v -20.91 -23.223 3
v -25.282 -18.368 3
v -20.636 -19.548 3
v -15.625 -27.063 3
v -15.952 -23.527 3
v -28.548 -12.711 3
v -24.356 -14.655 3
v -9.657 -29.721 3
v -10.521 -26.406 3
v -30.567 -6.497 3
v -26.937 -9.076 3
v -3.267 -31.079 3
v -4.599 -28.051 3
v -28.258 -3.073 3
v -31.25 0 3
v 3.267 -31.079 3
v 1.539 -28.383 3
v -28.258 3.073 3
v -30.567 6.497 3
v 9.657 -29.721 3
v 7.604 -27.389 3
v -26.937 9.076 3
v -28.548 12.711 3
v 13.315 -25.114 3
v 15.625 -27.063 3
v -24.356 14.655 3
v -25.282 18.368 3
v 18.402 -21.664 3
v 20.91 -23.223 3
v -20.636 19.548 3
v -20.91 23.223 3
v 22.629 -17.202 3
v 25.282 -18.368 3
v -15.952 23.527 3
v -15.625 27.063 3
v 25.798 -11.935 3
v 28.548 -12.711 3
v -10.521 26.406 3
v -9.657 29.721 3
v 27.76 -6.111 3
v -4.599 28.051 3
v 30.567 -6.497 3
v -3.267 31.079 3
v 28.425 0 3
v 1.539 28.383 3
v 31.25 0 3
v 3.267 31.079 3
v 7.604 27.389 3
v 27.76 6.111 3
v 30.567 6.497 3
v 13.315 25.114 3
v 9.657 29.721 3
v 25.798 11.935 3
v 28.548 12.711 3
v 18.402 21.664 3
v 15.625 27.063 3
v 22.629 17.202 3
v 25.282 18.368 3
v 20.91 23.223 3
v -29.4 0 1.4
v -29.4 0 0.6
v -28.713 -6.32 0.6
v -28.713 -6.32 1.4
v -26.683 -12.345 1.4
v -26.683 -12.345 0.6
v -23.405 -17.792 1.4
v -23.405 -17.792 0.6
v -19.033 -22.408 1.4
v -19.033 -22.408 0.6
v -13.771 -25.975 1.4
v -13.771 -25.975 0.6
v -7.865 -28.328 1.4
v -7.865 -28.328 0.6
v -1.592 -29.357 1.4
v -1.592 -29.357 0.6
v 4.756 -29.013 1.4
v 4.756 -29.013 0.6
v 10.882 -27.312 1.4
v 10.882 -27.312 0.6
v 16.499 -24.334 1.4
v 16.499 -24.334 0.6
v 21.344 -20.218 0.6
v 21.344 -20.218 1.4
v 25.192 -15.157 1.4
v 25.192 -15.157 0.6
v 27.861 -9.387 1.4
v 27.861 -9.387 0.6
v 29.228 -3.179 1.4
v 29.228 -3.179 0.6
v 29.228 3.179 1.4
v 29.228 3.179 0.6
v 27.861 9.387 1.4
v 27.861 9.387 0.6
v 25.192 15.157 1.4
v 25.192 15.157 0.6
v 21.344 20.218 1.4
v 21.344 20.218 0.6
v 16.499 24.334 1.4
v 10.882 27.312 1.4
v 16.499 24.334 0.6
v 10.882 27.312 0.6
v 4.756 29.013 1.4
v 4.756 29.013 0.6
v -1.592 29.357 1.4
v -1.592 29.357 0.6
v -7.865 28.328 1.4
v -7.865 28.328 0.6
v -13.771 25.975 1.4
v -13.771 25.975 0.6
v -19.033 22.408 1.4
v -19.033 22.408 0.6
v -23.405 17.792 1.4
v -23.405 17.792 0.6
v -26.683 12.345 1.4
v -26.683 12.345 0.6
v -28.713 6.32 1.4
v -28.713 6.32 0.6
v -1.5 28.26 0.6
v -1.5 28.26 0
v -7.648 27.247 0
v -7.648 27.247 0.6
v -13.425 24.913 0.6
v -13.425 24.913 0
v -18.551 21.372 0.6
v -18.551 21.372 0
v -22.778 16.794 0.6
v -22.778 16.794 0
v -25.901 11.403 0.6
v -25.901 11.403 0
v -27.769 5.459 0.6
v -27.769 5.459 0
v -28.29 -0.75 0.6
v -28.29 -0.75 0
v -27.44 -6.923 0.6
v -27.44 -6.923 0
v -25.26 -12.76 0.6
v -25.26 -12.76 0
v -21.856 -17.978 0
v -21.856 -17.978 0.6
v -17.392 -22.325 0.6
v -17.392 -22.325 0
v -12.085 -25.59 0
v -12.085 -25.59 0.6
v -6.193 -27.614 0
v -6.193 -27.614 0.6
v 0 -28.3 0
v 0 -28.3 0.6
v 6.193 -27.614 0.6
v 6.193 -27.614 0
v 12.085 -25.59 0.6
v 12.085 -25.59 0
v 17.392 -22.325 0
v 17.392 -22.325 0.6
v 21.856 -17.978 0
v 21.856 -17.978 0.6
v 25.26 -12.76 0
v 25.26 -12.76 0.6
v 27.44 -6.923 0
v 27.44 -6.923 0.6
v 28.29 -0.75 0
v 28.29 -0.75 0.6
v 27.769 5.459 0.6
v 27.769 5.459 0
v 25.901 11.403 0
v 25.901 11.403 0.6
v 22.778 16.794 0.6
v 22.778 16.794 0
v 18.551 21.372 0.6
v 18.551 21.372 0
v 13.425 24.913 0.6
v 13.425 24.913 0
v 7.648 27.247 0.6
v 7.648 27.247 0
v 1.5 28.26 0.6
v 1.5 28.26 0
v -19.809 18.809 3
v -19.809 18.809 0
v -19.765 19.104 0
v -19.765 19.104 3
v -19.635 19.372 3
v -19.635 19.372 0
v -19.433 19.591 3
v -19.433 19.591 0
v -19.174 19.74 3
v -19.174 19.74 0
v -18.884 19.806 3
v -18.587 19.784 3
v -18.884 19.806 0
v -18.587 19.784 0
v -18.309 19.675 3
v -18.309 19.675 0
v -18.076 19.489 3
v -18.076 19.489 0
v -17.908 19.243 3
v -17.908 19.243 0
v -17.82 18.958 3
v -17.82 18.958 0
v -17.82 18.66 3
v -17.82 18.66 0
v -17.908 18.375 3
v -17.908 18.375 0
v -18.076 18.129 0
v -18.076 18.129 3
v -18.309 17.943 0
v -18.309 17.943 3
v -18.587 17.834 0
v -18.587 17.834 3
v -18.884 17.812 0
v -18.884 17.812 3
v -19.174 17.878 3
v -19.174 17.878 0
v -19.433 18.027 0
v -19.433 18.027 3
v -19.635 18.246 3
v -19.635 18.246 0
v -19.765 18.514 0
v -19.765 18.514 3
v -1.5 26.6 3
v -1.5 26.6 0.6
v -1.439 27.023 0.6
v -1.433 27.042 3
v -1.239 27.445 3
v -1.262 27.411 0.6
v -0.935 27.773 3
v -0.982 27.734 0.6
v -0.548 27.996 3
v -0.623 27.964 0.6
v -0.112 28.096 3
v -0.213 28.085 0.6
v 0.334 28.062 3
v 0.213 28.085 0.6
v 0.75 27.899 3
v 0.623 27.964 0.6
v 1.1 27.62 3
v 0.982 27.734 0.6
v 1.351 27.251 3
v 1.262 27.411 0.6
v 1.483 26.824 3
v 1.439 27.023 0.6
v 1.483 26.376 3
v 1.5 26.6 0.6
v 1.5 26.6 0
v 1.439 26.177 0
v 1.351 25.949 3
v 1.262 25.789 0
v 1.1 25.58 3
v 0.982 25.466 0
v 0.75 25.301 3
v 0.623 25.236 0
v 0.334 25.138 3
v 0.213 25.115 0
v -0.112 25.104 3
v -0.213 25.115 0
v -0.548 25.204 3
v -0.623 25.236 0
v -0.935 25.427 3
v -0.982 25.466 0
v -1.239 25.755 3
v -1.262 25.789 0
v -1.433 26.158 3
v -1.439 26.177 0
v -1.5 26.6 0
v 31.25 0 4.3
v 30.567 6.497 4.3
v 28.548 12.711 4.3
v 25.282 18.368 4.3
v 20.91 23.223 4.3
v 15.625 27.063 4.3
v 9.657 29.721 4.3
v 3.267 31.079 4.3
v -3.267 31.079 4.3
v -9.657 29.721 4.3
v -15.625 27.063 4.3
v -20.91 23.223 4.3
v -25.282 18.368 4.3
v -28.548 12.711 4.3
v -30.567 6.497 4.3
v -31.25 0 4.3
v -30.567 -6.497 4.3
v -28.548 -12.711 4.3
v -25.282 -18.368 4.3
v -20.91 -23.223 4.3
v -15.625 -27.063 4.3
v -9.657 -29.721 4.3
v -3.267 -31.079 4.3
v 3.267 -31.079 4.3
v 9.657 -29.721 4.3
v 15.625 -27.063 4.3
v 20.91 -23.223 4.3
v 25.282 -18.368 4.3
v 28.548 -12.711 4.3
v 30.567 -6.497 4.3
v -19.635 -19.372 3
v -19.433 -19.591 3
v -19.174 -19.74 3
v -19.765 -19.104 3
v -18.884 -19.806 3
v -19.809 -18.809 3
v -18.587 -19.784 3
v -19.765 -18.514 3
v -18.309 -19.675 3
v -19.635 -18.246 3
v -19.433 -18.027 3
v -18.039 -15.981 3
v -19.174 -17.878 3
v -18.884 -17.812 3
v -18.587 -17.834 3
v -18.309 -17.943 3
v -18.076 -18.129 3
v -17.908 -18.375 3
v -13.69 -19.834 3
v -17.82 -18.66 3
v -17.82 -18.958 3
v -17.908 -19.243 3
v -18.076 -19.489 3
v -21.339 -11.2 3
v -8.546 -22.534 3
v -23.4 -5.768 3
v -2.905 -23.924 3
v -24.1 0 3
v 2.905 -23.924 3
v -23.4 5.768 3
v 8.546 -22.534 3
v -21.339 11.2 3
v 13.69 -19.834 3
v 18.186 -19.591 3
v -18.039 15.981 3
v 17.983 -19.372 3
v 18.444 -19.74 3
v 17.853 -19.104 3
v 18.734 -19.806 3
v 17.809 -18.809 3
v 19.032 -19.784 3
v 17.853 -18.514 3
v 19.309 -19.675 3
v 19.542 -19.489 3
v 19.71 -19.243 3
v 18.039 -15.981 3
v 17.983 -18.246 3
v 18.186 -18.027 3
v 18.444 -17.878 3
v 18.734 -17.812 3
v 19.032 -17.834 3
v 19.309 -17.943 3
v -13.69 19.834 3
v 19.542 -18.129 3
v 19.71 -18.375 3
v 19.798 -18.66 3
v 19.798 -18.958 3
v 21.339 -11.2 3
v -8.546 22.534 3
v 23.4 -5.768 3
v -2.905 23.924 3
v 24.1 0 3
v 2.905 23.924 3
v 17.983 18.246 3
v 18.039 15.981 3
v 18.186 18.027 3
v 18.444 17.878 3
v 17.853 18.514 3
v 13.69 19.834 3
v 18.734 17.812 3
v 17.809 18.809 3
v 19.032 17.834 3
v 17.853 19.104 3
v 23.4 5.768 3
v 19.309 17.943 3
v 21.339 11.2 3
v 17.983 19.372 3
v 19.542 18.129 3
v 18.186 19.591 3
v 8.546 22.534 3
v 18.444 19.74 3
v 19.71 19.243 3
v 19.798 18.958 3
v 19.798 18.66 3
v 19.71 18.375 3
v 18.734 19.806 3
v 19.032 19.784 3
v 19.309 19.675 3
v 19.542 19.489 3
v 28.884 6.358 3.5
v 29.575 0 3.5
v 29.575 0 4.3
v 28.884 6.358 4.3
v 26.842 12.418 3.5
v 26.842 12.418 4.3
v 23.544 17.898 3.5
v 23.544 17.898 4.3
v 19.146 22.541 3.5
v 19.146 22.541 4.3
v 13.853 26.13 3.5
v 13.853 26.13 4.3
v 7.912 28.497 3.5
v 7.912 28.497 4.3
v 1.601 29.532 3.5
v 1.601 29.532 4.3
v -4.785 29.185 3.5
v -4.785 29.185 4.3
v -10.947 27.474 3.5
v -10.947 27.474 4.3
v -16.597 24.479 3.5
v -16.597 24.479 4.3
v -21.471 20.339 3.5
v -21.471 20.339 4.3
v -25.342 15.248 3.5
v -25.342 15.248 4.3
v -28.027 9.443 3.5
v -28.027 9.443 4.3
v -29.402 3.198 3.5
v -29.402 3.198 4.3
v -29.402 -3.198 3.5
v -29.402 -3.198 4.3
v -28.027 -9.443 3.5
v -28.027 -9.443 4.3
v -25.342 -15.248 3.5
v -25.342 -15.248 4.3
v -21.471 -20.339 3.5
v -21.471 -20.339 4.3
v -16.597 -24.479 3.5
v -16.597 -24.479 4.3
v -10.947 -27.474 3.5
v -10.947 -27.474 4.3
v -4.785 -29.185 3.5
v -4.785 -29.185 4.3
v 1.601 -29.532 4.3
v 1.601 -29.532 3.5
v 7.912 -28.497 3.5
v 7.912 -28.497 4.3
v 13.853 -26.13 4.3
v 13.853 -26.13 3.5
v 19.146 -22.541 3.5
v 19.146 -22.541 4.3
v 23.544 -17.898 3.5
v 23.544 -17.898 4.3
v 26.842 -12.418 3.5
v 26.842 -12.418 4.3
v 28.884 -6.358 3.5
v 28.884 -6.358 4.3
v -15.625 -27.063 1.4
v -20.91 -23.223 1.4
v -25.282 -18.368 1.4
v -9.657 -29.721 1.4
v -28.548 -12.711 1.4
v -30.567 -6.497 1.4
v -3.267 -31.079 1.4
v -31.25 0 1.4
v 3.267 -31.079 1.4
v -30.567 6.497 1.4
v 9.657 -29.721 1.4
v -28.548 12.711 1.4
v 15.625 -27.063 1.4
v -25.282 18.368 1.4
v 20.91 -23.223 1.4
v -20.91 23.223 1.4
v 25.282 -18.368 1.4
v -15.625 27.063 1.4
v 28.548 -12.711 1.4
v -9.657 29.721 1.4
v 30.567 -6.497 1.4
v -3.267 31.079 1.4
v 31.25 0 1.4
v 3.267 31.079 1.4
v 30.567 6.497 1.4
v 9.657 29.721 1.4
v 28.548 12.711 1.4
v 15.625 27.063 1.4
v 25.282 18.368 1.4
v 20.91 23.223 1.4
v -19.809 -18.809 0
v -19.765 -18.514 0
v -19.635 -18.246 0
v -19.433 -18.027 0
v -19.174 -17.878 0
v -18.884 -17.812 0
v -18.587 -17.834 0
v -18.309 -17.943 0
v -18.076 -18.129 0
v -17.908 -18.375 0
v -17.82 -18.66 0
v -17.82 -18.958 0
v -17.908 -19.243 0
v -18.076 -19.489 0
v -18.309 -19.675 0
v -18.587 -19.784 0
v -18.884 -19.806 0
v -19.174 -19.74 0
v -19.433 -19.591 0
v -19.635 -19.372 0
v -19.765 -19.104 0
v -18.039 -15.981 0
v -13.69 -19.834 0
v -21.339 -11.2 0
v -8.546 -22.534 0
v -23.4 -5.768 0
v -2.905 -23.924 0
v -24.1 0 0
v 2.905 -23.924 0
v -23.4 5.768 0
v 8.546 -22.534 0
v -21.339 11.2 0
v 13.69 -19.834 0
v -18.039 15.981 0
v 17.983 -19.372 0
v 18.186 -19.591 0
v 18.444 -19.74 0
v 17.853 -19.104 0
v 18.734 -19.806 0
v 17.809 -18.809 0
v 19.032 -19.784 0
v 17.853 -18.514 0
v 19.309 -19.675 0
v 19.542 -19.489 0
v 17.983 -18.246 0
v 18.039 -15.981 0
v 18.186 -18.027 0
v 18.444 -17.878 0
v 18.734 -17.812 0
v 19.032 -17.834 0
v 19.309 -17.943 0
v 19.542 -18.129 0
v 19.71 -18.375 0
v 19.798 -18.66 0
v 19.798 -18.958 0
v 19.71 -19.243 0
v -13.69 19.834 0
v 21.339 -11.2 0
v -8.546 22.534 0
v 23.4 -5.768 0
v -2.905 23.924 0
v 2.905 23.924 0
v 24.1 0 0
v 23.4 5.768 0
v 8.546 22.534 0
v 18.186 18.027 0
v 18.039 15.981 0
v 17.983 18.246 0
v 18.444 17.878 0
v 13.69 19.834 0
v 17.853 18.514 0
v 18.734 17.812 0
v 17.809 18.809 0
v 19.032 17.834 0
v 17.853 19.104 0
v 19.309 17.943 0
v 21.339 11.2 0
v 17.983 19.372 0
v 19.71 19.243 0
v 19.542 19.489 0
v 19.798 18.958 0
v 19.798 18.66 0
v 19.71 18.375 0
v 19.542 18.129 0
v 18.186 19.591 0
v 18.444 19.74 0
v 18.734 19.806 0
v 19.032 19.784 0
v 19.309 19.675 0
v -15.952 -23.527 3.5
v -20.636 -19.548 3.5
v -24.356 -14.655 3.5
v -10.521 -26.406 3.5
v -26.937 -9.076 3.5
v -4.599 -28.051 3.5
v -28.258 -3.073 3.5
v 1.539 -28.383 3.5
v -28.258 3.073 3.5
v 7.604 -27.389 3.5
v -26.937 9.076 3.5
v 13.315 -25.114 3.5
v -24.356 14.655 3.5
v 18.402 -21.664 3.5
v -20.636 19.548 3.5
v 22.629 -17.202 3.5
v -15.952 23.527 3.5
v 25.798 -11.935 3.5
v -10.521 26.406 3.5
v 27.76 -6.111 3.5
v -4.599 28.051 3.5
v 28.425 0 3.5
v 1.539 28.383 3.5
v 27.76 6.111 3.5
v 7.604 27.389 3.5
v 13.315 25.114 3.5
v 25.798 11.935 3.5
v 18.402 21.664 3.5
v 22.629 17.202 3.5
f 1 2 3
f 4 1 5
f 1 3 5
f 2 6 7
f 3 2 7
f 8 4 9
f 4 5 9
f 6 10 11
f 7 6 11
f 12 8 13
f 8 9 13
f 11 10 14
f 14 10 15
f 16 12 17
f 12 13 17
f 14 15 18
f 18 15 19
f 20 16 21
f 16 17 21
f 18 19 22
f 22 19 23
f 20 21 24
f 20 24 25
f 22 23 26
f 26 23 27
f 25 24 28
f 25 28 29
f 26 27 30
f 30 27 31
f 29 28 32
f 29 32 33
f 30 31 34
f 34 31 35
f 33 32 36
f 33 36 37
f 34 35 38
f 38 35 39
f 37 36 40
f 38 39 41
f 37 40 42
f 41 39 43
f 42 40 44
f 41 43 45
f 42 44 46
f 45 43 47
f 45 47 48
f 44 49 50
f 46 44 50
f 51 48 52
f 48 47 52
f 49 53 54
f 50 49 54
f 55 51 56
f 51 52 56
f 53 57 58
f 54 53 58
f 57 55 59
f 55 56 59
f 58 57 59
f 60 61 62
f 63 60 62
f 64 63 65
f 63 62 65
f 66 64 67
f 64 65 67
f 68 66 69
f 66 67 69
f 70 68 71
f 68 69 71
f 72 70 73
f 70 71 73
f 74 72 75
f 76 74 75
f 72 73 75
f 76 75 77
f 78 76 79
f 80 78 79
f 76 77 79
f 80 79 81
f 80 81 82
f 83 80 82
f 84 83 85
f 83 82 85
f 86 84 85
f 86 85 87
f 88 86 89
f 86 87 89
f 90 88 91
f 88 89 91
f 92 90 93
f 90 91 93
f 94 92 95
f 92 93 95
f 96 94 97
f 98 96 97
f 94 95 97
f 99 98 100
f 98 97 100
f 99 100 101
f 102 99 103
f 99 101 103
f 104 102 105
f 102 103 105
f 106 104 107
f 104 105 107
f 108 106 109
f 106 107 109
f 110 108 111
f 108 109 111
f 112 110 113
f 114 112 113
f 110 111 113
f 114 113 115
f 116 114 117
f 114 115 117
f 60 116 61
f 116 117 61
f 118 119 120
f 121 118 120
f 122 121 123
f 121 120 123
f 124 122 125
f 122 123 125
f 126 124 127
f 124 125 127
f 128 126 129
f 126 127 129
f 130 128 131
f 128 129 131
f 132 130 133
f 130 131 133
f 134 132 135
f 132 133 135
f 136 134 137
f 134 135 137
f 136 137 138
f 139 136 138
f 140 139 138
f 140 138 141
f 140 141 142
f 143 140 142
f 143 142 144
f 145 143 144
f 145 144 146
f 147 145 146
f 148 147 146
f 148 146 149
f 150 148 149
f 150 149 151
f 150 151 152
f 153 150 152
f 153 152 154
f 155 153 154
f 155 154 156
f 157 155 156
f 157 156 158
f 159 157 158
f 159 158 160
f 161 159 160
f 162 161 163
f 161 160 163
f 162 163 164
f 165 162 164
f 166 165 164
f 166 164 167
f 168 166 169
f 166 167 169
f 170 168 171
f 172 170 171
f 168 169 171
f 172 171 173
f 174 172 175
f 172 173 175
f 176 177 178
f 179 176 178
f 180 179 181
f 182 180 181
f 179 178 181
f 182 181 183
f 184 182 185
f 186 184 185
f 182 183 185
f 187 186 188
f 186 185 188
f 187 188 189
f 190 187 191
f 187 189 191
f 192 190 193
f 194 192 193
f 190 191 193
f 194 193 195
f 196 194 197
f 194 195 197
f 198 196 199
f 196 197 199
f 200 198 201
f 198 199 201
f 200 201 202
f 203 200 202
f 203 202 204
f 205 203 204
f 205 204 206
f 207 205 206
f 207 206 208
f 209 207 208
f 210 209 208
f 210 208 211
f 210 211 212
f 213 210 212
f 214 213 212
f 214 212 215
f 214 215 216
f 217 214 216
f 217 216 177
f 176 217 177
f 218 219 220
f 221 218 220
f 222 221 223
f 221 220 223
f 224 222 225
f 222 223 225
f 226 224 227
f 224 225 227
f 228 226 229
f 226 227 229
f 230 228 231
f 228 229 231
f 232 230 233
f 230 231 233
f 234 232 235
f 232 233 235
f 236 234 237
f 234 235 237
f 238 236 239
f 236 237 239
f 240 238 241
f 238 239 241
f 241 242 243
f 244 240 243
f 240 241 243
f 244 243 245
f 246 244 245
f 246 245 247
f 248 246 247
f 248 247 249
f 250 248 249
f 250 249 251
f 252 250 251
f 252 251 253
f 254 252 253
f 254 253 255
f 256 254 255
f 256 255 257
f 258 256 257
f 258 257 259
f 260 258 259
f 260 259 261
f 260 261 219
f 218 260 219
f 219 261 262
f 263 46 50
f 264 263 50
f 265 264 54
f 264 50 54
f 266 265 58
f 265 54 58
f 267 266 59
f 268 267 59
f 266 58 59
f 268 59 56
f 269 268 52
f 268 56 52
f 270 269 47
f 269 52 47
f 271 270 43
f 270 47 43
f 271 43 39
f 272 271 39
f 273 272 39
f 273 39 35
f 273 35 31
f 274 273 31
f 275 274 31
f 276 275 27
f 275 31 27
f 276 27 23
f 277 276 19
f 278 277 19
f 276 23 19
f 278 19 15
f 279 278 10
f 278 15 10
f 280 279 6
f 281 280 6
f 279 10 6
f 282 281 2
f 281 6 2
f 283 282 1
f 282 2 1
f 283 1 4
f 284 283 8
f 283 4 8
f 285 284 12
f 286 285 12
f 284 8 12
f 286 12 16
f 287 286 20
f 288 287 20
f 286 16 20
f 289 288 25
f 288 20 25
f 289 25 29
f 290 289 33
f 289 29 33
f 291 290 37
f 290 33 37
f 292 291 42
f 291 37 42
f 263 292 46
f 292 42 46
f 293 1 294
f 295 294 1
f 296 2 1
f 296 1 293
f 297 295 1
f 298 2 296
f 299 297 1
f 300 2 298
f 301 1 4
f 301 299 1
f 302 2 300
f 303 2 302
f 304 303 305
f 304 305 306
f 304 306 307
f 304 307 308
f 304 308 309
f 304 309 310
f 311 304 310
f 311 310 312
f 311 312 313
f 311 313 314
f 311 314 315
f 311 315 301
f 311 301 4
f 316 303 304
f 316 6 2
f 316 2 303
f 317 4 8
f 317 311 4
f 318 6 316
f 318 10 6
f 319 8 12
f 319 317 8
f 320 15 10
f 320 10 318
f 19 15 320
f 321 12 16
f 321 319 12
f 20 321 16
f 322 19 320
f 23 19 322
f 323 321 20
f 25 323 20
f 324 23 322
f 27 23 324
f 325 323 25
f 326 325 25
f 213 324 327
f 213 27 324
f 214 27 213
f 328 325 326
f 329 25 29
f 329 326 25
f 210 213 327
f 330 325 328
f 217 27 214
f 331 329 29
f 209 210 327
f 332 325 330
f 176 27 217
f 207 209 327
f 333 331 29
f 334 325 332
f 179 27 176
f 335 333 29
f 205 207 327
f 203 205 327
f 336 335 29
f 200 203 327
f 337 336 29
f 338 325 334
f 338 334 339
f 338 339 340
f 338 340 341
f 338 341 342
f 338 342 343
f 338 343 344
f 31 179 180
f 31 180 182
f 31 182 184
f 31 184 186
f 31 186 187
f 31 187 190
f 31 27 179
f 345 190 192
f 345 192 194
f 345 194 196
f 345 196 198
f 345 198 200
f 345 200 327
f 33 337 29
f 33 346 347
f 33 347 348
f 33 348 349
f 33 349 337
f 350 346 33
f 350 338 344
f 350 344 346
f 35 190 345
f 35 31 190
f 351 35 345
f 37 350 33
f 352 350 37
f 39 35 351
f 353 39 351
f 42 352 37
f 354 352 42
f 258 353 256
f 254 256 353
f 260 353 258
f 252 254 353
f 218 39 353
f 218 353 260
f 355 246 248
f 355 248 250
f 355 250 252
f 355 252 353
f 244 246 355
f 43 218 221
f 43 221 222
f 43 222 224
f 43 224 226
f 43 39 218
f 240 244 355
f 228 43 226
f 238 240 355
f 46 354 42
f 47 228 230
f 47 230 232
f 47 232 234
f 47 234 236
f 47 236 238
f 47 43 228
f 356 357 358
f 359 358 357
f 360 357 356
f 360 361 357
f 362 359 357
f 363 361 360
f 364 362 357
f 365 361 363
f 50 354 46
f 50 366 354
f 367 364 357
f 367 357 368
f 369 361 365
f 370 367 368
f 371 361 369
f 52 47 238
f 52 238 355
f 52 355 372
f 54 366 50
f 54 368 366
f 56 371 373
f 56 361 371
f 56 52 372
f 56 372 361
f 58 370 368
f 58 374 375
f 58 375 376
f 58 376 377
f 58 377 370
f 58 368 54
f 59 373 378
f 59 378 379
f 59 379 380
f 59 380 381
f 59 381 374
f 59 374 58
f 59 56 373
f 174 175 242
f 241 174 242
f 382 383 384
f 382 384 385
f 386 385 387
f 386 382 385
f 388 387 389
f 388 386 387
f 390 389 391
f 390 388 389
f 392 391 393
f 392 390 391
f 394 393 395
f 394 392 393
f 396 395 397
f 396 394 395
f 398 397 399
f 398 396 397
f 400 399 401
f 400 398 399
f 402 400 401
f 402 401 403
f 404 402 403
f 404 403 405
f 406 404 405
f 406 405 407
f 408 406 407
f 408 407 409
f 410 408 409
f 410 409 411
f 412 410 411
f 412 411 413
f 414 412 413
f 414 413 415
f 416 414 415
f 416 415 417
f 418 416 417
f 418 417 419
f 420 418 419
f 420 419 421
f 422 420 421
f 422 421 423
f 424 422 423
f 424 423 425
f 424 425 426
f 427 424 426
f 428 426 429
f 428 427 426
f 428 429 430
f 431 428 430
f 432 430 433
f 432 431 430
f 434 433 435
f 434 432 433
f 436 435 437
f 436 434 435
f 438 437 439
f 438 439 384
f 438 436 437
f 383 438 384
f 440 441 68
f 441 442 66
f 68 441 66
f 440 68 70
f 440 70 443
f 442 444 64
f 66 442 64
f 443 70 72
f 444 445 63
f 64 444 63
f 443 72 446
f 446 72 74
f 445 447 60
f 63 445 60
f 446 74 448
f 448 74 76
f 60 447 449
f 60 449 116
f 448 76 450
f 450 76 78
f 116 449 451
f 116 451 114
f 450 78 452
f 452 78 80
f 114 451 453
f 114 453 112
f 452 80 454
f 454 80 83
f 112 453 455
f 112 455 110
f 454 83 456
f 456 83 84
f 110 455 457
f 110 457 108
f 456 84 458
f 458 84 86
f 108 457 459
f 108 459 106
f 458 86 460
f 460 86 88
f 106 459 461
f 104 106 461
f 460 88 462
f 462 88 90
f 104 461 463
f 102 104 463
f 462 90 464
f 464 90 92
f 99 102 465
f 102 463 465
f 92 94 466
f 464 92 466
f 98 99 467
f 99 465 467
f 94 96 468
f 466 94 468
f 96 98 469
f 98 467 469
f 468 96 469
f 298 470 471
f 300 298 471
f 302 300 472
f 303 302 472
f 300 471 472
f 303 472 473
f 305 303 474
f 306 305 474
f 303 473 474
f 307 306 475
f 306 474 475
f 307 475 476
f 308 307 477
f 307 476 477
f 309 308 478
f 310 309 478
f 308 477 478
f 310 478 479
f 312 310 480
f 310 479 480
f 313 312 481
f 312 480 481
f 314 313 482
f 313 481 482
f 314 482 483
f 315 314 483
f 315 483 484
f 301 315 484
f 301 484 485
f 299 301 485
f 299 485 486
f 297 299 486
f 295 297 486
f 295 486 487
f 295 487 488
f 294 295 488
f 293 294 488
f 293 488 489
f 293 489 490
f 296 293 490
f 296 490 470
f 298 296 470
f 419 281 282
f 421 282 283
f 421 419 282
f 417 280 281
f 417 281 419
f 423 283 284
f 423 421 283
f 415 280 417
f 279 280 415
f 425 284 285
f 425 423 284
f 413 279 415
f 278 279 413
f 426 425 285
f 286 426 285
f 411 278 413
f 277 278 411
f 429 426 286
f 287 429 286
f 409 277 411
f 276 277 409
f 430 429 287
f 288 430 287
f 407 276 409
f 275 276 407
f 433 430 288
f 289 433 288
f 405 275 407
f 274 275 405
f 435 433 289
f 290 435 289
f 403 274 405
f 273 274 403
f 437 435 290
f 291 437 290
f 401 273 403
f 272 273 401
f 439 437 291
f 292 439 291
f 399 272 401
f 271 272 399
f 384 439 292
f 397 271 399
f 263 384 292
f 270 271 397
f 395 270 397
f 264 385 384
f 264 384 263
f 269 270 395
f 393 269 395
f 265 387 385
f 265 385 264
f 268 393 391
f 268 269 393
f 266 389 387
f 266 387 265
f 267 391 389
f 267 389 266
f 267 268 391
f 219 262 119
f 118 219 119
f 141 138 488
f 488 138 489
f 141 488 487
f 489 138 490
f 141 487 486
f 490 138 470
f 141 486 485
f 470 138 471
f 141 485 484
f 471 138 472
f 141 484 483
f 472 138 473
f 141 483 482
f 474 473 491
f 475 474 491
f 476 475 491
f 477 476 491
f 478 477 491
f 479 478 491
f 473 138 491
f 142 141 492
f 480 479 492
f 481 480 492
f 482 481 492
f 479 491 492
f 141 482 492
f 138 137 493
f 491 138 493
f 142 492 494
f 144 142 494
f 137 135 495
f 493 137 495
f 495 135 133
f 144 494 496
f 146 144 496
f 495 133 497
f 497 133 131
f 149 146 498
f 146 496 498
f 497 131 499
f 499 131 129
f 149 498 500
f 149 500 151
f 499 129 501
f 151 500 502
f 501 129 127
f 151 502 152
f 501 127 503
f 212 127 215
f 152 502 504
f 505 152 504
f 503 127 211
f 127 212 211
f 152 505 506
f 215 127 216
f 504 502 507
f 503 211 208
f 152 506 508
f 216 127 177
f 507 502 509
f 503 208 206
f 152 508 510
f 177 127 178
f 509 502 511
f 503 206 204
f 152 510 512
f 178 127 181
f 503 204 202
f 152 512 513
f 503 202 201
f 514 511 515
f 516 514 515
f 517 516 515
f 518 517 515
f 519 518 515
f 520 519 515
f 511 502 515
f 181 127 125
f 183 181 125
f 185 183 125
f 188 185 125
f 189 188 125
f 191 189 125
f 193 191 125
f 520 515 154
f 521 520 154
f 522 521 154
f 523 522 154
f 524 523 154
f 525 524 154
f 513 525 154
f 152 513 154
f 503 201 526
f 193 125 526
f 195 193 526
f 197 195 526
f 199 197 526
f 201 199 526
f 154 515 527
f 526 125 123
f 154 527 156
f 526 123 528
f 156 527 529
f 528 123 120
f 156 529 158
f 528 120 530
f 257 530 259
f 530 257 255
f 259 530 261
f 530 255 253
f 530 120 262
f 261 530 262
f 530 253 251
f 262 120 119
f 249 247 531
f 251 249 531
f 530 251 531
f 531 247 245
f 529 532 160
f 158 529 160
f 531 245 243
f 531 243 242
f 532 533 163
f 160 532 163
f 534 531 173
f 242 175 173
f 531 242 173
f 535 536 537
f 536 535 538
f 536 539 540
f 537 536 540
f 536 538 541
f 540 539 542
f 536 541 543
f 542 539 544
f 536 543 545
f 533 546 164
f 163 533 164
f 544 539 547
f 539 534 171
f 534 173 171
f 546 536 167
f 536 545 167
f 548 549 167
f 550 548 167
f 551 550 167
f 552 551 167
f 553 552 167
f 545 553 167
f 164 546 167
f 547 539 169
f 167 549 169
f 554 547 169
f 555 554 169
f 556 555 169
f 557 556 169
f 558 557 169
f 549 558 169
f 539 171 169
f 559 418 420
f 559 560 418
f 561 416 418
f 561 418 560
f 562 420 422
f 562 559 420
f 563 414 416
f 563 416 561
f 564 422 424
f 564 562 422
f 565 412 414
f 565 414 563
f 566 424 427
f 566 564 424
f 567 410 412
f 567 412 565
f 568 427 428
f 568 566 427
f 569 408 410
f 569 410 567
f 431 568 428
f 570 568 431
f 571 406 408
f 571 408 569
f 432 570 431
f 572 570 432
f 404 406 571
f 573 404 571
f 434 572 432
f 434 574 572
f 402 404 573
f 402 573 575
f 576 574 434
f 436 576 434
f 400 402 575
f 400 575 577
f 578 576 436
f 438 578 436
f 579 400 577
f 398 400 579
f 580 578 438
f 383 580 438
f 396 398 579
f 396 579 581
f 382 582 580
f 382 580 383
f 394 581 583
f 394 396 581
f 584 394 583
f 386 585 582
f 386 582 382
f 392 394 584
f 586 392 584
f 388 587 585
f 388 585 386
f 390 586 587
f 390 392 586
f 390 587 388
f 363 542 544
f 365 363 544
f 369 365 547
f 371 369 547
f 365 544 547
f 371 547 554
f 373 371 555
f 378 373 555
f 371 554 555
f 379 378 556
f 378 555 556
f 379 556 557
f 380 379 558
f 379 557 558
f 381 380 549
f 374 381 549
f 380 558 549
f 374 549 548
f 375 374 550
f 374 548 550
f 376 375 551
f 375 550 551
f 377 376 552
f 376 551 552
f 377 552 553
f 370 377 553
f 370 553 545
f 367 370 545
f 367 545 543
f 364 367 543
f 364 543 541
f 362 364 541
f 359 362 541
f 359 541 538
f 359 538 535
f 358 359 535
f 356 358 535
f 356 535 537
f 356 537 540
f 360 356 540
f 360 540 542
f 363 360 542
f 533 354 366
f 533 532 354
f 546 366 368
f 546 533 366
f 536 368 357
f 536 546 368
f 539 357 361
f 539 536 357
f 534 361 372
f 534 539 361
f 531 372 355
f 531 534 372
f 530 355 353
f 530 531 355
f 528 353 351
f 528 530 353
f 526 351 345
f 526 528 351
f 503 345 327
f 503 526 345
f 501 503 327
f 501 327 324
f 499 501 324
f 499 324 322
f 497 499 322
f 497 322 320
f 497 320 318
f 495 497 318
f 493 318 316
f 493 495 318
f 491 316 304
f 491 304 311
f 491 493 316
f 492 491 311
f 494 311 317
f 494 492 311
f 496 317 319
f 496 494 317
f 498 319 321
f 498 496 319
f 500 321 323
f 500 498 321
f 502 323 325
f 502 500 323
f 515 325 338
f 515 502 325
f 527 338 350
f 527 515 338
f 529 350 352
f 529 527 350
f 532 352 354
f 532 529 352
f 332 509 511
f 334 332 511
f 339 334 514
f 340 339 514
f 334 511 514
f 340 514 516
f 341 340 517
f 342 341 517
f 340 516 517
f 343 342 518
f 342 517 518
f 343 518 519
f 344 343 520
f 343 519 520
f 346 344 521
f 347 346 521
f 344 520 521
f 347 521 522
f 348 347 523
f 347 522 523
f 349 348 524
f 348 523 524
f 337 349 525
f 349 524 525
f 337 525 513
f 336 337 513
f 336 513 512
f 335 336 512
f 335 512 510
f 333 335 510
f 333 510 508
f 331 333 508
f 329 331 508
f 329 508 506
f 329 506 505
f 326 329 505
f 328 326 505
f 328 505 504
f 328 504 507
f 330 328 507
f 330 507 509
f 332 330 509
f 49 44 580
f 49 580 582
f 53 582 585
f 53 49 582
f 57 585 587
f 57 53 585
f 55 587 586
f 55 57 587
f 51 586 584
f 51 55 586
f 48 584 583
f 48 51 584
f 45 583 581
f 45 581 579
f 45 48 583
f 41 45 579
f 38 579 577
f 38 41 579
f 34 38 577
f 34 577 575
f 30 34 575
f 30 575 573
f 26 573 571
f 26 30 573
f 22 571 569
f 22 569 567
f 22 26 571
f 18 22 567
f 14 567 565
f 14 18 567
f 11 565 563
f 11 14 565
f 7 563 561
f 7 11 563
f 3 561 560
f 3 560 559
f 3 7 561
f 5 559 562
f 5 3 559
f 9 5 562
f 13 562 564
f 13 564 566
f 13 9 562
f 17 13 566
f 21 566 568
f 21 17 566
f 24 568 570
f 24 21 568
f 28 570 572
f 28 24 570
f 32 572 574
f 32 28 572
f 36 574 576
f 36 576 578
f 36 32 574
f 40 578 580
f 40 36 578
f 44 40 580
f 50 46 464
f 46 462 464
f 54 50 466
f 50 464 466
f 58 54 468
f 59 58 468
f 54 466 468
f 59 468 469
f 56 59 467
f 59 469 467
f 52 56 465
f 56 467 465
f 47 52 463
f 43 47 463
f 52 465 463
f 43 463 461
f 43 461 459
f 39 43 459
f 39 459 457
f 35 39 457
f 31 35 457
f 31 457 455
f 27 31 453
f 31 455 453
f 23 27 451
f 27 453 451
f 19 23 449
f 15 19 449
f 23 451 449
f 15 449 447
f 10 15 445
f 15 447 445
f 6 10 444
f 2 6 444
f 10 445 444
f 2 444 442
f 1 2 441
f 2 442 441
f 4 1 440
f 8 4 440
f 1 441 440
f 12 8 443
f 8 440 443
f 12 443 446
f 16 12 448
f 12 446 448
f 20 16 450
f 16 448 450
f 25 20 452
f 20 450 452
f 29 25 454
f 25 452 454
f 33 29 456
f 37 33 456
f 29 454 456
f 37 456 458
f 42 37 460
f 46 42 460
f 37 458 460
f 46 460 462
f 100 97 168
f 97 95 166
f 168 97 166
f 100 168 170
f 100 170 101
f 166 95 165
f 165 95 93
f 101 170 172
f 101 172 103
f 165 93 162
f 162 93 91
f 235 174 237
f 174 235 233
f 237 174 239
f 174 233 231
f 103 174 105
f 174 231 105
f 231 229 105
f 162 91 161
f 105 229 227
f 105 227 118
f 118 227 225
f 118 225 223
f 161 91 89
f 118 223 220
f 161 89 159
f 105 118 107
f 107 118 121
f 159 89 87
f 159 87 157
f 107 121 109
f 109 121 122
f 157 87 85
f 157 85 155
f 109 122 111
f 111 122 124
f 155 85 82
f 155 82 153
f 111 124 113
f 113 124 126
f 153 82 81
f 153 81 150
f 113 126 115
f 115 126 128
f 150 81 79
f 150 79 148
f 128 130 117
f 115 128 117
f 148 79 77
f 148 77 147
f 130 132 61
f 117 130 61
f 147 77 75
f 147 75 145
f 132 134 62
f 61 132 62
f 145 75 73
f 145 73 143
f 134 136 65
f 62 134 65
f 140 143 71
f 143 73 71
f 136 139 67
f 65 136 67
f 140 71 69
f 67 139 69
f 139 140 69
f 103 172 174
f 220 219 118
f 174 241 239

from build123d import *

# Parameters (mm, degrees)
SKETCH1_R            = 28.3
SKETCH1_R_2          = 24.1
BOSS_EXTRUDE1_DEPTH  = 0.6
SKETCH2_R            = 29.4
SKETCH2_R_2          = 24.1
BOSS_EXTRUDE2_DEPTH  = 0.8
SKETCH3_R            = 31.25
SKETCH3_R_2          = 24.1
BOSS_EXTRUDE3_DEPTH  = 1.6
SKETCH4_R            = 31.25
SKETCH4_R_2          = 28.425
BOSS_EXTRUDE4_DEPTH  = 0.5
SKETCH5_R            = 31.25
SKETCH5_R_2          = 29.575
BOSS_EXTRUDE5_DEPTH  = 0.8
SKETCH6_R            = 1
SKETCH6_R_2          = 1.5
CUT_EXTRUDE1_DEPTH   = 45.402871529
CUT_EXTRUDE2_DEPTH   = 0.6
SPLIT1_START         = 3
SPLIT1_OUTLINE_R     = 31.25
SPLIT1_OUTLINE_R_2   = 28.425
SPLIT1_DEPTH         = 1.3
SPLIT1_2_OUTLINE_R   = 31.25
SPLIT1_2_OUTLINE_R_2 = 29.575
SPLIT1_2_DEPTH       = 1.3
SPLIT1_3_OUTLINE_R   = 29.575
SPLIT1_3_OUTLINE_R_2 = 28.425
SPLIT1_3_DEPTH       = 0.5


# Read off the part's stored shape, not the designer's step: Split1
with BuildPart() as part:
    # Sketch1 → Boss-Extrude1 (new body)
    with BuildSketch(Plane.XY):
        Circle(SKETCH1_R)
        Circle(SKETCH1_R_2, mode=Mode.SUBTRACT)
    extrude(amount=BOSS_EXTRUDE1_DEPTH)

    # Sketch2 → Boss-Extrude2 (add)
    with BuildSketch(Plane.XY.offset(0.6)):
        with Locations(Location((0, 0, 0), (0, 0, 180))):
            Circle(SKETCH2_R)
        Circle(SKETCH2_R_2, mode=Mode.SUBTRACT)
    extrude(amount=BOSS_EXTRUDE2_DEPTH)

    # Sketch3 → Boss-Extrude3 (add)
    with BuildSketch(Plane.XY.offset(1.4)):
        Circle(SKETCH3_R)
        Circle(SKETCH3_R_2, mode=Mode.SUBTRACT)
    extrude(amount=BOSS_EXTRUDE3_DEPTH)

    # Sketch4 → Boss-Extrude4 (add)
    with BuildSketch(Plane.XY.offset(3)):
        Circle(SKETCH4_R)
        Circle(SKETCH4_R_2, mode=Mode.SUBTRACT)
    extrude(amount=BOSS_EXTRUDE4_DEPTH)

    # Sketch5 → Boss-Extrude5 (add)
    with BuildSketch(Plane.XY.offset(3.5)):
        Circle(SKETCH5_R)
        Circle(SKETCH5_R_2, mode=Mode.SUBTRACT)
    extrude(amount=BOSS_EXTRUDE5_DEPTH)

    # Sketch6 → Cut-Extrude1 (cut, through all)
    with BuildSketch(Plane(origin=(0, 0, 0), x_dir=(-1, 0, 0), z_dir=(0, 0, -1))):
        with Locations((18.80904038, 18.80904038)):
            Circle(SKETCH6_R)
        with Locations((18.80904038, -18.80904038)):
            Circle(SKETCH6_R)
        with Locations((-18.80904038, -18.80904038)):
            Circle(SKETCH6_R)
        with Locations((-18.80904038, 18.80904038)):
            Circle(SKETCH6_R)
        with Locations((0, 26.6)):
            Circle(SKETCH6_R_2)
    extrude(amount=-CUT_EXTRUDE1_DEPTH, mode=Mode.SUBTRACT)

    # Sketch7 → Cut-Extrude2 (cut)
    with BuildSketch(Plane(origin=(0, 0, 0), x_dir=(-1, 0, 0), z_dir=(0, 0, -1))):
        with BuildLine():
            Line((-1.5, 28.260219391), (-1.5, 26.6))
            ThreePointArc((-1.5, 26.6), (0, 28.1), (1.5, 26.6))
            Line((1.5, 26.6), (1.5, 28.260219391))
            ThreePointArc((1.5, 28.260219391), (0, 28.3), (-1.5, 28.260219391))
        make_face()
    extrude(amount=-CUT_EXTRUDE2_DEPTH, mode=Mode.SUBTRACT)

    # Split1 outline → Split1 (cut)
    with BuildSketch(Plane.XY.offset(SPLIT1_START)):
        Circle(SPLIT1_OUTLINE_R)
        Circle(SPLIT1_OUTLINE_R_2, mode=Mode.SUBTRACT)
    extrude(amount=SPLIT1_DEPTH, mode=Mode.SUBTRACT)


with BuildPart() as body_2:
    # Split1 2 outline → Split1 2 (new body)
    with BuildSketch(Plane.XY.offset(SPLIT1_START)):
        Circle(SPLIT1_2_OUTLINE_R)
        Circle(SPLIT1_2_OUTLINE_R_2, mode=Mode.SUBTRACT)
    extrude(amount=SPLIT1_2_DEPTH)

    # Split1 3 outline → Split1 3 (add)
    with BuildSketch(Plane.XY.offset(SPLIT1_START)):
        Circle(SPLIT1_3_OUTLINE_R)
        Circle(SPLIT1_3_OUTLINE_R_2, mode=Mode.SUBTRACT)
    extrude(amount=SPLIT1_3_DEPTH)


solid = Compound([part.part, body_2.part])
